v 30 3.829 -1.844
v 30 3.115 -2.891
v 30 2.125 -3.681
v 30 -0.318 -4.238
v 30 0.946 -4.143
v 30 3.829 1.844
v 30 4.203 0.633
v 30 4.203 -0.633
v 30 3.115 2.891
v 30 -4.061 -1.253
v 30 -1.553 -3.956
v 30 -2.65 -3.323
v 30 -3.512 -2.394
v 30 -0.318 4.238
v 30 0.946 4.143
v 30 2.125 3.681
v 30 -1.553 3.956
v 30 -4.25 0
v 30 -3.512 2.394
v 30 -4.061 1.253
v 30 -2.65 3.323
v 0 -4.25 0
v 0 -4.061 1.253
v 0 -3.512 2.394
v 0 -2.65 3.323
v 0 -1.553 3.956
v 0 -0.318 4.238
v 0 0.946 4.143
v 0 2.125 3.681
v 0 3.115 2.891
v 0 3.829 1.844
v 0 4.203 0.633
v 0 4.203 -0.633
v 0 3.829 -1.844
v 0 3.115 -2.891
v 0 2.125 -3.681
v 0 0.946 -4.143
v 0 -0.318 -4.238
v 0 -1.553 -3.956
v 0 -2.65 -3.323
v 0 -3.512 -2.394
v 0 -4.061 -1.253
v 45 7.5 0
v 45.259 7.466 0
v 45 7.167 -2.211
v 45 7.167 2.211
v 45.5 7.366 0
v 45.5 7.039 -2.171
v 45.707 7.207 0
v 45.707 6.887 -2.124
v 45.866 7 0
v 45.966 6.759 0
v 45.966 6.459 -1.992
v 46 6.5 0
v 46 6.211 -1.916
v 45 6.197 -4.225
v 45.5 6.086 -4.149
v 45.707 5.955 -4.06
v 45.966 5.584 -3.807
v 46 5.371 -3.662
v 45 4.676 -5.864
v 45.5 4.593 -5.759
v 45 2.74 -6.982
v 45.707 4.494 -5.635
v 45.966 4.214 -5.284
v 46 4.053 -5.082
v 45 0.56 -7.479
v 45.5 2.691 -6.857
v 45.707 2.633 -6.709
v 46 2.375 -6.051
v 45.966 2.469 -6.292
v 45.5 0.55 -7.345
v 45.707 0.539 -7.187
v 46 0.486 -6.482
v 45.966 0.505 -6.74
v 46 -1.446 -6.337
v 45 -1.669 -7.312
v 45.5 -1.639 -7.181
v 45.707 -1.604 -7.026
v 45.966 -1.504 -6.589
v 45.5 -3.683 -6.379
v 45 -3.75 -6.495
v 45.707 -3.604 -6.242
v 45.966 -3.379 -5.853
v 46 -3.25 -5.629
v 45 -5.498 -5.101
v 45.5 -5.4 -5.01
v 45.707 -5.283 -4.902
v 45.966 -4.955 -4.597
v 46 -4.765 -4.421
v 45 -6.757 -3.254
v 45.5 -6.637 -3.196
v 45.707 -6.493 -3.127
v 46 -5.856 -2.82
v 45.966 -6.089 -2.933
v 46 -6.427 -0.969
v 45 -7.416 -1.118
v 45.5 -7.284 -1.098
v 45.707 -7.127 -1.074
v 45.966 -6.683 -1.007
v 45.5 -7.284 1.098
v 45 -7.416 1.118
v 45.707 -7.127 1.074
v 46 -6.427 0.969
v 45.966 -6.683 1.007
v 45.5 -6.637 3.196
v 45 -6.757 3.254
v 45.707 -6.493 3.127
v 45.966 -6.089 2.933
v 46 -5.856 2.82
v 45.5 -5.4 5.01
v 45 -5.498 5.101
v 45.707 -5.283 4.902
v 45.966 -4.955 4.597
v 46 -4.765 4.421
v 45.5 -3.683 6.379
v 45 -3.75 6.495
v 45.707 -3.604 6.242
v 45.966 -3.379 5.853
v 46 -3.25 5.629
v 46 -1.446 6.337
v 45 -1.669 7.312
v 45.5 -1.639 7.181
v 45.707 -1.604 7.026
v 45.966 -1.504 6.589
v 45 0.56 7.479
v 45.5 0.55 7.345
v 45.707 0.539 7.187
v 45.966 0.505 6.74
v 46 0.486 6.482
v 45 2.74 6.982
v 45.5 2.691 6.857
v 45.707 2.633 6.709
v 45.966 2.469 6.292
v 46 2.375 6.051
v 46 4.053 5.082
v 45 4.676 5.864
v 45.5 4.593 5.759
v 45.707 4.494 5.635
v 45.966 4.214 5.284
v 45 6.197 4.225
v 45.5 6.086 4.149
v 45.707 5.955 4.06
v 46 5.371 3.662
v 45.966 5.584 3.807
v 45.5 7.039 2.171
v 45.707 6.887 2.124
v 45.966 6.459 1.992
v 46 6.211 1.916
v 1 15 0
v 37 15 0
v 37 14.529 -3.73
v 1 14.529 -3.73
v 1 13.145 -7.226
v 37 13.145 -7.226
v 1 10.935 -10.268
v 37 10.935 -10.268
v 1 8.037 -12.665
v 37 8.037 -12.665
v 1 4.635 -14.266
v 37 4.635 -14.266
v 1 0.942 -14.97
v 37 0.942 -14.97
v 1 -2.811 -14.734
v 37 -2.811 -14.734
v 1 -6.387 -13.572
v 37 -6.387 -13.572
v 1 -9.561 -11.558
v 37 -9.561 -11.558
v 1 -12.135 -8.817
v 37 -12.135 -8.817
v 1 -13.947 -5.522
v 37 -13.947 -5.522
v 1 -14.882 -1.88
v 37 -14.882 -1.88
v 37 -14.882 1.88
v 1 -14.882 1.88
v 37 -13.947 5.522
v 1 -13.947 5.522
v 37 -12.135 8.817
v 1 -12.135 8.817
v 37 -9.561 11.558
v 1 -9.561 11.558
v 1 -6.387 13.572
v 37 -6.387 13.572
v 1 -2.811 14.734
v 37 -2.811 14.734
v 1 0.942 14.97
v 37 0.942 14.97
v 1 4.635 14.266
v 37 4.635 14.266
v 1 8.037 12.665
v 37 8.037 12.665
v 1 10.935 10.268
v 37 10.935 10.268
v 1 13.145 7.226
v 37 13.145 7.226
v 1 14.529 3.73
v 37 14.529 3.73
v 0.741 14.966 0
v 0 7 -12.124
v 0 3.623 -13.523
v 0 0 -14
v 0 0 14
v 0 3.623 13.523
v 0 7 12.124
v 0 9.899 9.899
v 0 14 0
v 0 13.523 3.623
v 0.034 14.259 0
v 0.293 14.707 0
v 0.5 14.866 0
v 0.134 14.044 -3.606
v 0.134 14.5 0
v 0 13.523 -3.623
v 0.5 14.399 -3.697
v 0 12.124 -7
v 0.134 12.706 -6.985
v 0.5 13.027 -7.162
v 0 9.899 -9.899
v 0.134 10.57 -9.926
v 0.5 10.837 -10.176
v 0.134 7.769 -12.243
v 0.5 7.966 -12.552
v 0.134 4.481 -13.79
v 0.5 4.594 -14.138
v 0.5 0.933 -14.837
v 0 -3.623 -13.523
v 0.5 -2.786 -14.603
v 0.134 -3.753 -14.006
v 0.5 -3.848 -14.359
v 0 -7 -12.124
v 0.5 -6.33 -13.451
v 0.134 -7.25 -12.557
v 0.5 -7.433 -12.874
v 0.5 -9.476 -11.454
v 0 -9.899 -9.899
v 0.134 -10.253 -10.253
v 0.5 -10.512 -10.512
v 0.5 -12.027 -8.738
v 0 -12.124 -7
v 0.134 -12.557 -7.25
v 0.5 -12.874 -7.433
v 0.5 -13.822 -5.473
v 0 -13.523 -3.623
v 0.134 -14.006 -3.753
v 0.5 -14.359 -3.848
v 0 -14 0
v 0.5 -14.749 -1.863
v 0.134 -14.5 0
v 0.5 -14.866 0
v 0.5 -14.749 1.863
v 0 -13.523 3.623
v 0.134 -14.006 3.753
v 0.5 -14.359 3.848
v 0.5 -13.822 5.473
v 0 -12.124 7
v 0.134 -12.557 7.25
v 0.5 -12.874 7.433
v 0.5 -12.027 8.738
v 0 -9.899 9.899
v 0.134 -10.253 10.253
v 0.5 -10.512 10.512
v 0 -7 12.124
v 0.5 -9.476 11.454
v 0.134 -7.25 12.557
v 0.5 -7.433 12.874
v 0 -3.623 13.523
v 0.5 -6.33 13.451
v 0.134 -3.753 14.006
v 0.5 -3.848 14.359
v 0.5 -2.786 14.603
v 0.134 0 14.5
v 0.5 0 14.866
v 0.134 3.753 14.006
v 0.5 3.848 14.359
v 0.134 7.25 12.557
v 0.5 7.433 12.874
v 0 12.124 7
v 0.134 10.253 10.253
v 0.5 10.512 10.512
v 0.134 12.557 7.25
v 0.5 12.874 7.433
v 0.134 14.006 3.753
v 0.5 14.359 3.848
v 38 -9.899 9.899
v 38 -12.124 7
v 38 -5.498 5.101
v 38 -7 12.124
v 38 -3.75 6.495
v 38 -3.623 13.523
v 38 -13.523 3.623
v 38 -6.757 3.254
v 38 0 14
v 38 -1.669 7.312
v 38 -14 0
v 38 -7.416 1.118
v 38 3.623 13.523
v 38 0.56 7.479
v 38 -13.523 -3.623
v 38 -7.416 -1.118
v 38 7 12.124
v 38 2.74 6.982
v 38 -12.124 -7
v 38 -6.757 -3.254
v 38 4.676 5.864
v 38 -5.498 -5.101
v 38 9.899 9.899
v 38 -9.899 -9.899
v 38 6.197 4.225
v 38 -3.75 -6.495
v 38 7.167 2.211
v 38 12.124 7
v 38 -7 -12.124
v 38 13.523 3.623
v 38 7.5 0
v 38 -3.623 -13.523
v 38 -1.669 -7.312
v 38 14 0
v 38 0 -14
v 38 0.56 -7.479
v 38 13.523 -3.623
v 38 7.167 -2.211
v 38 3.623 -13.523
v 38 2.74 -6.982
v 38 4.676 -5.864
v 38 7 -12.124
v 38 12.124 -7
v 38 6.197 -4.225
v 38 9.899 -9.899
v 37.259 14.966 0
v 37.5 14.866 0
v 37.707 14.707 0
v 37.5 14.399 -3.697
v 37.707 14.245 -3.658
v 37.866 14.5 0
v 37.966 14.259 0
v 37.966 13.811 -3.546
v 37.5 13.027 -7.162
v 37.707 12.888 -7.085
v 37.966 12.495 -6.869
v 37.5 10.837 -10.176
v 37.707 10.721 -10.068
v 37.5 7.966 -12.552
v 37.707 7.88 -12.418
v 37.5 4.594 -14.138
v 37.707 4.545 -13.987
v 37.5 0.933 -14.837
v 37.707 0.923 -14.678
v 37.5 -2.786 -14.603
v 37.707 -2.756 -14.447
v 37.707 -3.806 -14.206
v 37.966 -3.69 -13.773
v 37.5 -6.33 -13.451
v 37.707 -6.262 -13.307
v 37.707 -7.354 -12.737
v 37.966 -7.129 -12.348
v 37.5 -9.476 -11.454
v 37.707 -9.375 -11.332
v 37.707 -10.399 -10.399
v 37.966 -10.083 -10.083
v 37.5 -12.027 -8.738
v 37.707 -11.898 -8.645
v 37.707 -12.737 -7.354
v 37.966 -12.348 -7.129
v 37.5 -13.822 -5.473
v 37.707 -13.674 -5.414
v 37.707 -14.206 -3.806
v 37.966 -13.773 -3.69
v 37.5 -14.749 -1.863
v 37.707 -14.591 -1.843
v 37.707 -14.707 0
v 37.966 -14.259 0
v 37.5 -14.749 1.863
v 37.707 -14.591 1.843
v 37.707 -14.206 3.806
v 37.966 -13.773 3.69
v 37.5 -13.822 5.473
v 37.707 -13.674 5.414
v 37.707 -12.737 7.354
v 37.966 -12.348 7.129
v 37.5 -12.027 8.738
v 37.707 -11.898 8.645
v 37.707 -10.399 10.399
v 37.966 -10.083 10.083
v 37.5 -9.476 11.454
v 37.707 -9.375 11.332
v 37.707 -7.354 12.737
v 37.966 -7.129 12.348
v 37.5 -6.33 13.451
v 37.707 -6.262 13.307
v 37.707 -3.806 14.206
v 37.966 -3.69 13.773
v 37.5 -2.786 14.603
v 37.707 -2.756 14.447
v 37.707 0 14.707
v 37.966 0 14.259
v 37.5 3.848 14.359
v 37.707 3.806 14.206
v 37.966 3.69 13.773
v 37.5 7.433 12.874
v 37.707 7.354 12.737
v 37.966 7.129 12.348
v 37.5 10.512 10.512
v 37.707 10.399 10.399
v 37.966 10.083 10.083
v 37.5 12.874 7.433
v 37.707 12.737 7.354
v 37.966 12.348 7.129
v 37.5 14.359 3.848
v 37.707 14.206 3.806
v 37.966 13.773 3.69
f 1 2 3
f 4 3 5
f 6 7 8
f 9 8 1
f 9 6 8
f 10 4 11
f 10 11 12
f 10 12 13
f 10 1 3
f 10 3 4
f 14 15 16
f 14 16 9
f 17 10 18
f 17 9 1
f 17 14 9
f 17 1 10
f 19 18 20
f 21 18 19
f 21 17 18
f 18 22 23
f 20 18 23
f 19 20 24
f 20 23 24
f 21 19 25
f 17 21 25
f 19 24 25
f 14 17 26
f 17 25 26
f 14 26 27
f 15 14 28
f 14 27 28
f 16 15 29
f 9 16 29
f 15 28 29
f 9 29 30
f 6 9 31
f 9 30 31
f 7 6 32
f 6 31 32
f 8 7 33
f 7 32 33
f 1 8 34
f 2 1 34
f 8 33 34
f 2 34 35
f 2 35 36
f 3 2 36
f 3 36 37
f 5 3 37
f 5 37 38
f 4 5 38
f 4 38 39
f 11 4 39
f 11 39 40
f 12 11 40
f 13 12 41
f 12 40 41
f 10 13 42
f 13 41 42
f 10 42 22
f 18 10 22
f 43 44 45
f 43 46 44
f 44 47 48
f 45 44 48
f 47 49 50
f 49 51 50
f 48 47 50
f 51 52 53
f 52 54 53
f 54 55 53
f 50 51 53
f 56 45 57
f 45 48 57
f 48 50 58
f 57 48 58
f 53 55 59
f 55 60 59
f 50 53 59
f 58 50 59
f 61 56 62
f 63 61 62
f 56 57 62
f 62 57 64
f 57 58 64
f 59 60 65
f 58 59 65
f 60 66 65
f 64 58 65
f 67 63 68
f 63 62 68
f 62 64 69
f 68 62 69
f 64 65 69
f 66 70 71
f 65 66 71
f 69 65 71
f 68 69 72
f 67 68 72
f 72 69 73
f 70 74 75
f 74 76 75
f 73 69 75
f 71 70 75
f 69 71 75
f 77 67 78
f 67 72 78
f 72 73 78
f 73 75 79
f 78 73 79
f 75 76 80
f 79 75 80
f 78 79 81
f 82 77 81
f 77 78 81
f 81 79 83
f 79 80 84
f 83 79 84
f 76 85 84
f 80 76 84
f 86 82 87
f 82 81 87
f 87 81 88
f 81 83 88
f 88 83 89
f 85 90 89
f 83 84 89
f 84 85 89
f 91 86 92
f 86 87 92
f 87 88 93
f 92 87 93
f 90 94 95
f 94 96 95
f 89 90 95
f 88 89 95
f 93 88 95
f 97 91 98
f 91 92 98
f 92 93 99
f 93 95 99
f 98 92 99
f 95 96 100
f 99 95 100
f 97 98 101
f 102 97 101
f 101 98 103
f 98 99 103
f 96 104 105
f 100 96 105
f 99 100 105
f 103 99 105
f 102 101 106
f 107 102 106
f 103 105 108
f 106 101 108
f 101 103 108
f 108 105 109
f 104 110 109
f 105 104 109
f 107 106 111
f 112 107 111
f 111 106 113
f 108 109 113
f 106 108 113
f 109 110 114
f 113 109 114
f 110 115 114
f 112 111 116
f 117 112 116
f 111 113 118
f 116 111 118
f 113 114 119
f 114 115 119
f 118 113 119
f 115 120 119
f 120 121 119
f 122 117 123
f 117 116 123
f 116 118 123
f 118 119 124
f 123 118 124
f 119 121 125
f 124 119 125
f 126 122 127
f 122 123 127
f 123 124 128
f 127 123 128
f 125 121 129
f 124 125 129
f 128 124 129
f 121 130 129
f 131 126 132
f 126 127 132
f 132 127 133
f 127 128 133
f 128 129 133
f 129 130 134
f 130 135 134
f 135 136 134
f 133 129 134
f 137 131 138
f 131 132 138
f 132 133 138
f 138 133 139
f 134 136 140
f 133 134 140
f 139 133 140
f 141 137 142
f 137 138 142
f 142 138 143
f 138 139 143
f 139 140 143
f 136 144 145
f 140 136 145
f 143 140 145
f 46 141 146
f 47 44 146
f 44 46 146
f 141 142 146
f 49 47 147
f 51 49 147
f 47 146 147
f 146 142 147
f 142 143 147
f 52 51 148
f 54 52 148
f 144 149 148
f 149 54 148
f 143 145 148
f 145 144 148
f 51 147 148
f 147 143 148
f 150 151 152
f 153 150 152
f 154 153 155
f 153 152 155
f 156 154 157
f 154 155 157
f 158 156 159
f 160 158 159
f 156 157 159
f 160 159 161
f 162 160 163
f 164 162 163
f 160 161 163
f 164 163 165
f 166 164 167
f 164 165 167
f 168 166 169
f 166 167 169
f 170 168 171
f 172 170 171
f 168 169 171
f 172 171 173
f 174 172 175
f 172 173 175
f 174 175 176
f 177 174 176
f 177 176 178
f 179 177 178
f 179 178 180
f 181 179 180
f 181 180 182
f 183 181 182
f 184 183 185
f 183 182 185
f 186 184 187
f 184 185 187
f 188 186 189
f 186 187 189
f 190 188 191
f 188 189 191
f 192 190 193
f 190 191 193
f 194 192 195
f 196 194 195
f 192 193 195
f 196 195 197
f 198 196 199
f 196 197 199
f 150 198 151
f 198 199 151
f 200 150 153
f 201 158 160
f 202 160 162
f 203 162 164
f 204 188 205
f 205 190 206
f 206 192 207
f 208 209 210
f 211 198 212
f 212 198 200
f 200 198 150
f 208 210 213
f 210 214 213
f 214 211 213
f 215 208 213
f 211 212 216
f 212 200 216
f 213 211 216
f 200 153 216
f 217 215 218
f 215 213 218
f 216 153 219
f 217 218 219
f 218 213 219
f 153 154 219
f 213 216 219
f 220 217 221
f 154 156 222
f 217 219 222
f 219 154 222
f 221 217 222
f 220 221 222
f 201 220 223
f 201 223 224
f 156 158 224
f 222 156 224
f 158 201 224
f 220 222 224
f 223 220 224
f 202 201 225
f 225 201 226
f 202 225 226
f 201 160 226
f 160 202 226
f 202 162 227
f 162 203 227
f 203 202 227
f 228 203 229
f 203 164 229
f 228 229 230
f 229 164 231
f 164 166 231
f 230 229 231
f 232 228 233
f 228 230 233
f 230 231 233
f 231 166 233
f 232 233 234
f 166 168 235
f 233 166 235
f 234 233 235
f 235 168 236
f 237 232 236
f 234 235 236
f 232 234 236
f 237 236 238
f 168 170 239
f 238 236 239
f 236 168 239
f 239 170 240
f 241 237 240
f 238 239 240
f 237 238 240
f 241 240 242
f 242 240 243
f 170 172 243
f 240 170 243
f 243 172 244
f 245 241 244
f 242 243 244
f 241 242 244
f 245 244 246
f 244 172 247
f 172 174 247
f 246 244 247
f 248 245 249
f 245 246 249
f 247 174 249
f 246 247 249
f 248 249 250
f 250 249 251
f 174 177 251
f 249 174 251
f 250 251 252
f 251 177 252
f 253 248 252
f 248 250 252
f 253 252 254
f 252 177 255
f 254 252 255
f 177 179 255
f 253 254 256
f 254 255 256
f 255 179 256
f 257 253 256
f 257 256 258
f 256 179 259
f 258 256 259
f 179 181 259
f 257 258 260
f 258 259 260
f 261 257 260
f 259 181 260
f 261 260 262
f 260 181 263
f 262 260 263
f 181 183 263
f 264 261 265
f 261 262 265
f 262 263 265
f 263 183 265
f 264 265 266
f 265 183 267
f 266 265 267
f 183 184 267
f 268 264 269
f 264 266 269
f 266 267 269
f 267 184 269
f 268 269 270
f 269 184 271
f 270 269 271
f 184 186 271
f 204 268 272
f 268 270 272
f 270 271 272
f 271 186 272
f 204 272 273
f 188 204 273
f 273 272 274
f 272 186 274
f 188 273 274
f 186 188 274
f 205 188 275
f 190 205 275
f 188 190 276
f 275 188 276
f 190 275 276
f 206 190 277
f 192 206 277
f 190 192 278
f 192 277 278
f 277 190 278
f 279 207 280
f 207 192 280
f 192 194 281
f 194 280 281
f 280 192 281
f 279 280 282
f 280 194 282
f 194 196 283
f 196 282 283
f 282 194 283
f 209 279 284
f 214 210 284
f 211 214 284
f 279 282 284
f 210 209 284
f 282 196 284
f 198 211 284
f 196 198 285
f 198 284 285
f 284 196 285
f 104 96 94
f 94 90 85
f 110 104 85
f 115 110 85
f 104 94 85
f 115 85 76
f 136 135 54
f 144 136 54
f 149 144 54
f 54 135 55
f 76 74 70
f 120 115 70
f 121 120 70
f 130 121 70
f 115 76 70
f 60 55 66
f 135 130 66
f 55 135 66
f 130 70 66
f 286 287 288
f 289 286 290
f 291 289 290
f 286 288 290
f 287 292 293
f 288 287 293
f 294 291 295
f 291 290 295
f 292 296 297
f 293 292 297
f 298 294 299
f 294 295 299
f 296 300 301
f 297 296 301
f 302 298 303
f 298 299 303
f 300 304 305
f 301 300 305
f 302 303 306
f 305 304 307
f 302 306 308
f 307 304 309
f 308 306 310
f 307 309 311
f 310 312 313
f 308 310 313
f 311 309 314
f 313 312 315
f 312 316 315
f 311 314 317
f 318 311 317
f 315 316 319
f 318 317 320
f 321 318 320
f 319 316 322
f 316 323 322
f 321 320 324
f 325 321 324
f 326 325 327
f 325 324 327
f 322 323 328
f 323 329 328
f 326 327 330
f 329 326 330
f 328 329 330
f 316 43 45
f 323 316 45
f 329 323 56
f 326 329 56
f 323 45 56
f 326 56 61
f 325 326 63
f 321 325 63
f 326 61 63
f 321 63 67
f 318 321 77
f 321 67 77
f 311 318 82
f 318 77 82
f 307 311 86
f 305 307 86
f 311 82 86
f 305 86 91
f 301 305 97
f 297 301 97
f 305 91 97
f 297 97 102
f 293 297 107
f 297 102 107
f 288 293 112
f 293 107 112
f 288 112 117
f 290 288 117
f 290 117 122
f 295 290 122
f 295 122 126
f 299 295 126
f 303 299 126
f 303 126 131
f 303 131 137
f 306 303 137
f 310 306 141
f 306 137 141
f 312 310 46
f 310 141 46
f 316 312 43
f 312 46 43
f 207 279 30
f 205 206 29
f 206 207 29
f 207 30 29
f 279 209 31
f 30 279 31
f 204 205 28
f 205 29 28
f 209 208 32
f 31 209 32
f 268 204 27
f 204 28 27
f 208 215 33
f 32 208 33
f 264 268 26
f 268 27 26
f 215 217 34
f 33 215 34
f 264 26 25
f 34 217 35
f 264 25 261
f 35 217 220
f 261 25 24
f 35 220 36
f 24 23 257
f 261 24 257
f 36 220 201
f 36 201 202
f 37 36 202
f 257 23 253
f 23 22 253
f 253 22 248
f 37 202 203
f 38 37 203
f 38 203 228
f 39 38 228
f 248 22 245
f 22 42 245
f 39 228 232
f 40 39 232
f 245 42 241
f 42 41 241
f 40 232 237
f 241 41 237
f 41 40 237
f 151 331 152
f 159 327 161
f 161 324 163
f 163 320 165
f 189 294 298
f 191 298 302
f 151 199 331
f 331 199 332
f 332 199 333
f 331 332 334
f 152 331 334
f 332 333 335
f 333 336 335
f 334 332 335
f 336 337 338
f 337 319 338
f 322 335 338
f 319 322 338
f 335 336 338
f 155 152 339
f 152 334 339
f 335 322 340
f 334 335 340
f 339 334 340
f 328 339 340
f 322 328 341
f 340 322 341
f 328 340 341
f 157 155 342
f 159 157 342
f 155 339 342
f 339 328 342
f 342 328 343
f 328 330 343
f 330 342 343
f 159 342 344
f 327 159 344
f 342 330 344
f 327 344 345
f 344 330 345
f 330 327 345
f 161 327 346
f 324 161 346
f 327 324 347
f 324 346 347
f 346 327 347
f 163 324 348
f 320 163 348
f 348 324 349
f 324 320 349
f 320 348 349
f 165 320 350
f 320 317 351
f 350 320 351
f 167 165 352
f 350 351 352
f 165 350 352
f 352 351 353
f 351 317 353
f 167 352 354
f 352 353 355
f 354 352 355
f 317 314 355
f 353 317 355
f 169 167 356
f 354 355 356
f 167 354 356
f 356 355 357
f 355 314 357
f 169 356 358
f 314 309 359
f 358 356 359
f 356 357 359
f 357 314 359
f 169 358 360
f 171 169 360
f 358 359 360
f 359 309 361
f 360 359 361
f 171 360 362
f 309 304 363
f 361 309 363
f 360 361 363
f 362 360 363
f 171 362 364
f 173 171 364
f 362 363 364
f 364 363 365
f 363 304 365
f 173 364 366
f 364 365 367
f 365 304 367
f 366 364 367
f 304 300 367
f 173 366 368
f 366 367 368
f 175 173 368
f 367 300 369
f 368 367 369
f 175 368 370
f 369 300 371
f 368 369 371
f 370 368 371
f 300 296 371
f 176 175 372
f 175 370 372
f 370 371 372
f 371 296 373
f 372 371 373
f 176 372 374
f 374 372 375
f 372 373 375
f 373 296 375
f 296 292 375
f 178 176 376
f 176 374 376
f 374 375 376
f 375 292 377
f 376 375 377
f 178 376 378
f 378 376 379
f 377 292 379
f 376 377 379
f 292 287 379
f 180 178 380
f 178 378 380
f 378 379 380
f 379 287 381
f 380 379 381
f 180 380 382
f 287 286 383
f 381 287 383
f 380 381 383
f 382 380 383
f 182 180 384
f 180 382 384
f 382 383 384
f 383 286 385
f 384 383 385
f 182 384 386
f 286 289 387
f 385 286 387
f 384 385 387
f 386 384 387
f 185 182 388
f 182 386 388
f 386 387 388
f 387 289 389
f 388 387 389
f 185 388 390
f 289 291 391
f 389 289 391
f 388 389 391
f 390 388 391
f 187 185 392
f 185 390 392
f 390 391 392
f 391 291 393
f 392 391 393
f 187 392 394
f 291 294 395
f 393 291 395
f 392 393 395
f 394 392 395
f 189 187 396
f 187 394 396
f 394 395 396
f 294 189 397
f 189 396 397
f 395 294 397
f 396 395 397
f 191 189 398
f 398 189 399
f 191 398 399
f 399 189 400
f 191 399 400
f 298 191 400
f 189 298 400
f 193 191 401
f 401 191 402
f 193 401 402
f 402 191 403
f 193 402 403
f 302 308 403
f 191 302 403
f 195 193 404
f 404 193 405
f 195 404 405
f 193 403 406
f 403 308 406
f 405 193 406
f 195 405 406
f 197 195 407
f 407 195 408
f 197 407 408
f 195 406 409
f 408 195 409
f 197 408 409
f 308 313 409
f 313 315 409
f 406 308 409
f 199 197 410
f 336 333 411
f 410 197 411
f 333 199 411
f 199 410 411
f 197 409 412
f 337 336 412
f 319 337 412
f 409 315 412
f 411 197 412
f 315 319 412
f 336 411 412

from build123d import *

# Parameters (mm, degrees)
IZIM2_R               = 4.25
KES_EKSTR_ZYON1_DEPTH = 30
RADYUS1_R             = 1


with BuildPart() as part:
    # Çizim1 → Döndür1 (revolve)
    with BuildSketch(Plane.XY):
        Polygon((0, 0), (0, 15), (38, 15), (38, 7.5), (46, 7.5), (46, 0), align=None)
    revolve(axis=Axis((46, 0, 0), (-1, 0, 0)))

    # Çizim2 → Kes-Ekstrüzyon1 (cut)
    with BuildSketch(Plane.ZY):
        with Locations(Location((0, 0, 0), (0, 0, 270))):
            Circle(IZIM2_R)
    extrude(amount=-KES_EKSTR_ZYON1_DEPTH, mode=Mode.SUBTRACT)

    # Radyus1
    radyus1_edges = [part.edges().sort_by_distance(p)[0] for p in [
        (46, -7.5, 0),
        (38, -15, 0),
        (0, -15, 0),
    ]]
    fillet(radyus1_edges, radius=RADYUS1_R)


solid = part.part
